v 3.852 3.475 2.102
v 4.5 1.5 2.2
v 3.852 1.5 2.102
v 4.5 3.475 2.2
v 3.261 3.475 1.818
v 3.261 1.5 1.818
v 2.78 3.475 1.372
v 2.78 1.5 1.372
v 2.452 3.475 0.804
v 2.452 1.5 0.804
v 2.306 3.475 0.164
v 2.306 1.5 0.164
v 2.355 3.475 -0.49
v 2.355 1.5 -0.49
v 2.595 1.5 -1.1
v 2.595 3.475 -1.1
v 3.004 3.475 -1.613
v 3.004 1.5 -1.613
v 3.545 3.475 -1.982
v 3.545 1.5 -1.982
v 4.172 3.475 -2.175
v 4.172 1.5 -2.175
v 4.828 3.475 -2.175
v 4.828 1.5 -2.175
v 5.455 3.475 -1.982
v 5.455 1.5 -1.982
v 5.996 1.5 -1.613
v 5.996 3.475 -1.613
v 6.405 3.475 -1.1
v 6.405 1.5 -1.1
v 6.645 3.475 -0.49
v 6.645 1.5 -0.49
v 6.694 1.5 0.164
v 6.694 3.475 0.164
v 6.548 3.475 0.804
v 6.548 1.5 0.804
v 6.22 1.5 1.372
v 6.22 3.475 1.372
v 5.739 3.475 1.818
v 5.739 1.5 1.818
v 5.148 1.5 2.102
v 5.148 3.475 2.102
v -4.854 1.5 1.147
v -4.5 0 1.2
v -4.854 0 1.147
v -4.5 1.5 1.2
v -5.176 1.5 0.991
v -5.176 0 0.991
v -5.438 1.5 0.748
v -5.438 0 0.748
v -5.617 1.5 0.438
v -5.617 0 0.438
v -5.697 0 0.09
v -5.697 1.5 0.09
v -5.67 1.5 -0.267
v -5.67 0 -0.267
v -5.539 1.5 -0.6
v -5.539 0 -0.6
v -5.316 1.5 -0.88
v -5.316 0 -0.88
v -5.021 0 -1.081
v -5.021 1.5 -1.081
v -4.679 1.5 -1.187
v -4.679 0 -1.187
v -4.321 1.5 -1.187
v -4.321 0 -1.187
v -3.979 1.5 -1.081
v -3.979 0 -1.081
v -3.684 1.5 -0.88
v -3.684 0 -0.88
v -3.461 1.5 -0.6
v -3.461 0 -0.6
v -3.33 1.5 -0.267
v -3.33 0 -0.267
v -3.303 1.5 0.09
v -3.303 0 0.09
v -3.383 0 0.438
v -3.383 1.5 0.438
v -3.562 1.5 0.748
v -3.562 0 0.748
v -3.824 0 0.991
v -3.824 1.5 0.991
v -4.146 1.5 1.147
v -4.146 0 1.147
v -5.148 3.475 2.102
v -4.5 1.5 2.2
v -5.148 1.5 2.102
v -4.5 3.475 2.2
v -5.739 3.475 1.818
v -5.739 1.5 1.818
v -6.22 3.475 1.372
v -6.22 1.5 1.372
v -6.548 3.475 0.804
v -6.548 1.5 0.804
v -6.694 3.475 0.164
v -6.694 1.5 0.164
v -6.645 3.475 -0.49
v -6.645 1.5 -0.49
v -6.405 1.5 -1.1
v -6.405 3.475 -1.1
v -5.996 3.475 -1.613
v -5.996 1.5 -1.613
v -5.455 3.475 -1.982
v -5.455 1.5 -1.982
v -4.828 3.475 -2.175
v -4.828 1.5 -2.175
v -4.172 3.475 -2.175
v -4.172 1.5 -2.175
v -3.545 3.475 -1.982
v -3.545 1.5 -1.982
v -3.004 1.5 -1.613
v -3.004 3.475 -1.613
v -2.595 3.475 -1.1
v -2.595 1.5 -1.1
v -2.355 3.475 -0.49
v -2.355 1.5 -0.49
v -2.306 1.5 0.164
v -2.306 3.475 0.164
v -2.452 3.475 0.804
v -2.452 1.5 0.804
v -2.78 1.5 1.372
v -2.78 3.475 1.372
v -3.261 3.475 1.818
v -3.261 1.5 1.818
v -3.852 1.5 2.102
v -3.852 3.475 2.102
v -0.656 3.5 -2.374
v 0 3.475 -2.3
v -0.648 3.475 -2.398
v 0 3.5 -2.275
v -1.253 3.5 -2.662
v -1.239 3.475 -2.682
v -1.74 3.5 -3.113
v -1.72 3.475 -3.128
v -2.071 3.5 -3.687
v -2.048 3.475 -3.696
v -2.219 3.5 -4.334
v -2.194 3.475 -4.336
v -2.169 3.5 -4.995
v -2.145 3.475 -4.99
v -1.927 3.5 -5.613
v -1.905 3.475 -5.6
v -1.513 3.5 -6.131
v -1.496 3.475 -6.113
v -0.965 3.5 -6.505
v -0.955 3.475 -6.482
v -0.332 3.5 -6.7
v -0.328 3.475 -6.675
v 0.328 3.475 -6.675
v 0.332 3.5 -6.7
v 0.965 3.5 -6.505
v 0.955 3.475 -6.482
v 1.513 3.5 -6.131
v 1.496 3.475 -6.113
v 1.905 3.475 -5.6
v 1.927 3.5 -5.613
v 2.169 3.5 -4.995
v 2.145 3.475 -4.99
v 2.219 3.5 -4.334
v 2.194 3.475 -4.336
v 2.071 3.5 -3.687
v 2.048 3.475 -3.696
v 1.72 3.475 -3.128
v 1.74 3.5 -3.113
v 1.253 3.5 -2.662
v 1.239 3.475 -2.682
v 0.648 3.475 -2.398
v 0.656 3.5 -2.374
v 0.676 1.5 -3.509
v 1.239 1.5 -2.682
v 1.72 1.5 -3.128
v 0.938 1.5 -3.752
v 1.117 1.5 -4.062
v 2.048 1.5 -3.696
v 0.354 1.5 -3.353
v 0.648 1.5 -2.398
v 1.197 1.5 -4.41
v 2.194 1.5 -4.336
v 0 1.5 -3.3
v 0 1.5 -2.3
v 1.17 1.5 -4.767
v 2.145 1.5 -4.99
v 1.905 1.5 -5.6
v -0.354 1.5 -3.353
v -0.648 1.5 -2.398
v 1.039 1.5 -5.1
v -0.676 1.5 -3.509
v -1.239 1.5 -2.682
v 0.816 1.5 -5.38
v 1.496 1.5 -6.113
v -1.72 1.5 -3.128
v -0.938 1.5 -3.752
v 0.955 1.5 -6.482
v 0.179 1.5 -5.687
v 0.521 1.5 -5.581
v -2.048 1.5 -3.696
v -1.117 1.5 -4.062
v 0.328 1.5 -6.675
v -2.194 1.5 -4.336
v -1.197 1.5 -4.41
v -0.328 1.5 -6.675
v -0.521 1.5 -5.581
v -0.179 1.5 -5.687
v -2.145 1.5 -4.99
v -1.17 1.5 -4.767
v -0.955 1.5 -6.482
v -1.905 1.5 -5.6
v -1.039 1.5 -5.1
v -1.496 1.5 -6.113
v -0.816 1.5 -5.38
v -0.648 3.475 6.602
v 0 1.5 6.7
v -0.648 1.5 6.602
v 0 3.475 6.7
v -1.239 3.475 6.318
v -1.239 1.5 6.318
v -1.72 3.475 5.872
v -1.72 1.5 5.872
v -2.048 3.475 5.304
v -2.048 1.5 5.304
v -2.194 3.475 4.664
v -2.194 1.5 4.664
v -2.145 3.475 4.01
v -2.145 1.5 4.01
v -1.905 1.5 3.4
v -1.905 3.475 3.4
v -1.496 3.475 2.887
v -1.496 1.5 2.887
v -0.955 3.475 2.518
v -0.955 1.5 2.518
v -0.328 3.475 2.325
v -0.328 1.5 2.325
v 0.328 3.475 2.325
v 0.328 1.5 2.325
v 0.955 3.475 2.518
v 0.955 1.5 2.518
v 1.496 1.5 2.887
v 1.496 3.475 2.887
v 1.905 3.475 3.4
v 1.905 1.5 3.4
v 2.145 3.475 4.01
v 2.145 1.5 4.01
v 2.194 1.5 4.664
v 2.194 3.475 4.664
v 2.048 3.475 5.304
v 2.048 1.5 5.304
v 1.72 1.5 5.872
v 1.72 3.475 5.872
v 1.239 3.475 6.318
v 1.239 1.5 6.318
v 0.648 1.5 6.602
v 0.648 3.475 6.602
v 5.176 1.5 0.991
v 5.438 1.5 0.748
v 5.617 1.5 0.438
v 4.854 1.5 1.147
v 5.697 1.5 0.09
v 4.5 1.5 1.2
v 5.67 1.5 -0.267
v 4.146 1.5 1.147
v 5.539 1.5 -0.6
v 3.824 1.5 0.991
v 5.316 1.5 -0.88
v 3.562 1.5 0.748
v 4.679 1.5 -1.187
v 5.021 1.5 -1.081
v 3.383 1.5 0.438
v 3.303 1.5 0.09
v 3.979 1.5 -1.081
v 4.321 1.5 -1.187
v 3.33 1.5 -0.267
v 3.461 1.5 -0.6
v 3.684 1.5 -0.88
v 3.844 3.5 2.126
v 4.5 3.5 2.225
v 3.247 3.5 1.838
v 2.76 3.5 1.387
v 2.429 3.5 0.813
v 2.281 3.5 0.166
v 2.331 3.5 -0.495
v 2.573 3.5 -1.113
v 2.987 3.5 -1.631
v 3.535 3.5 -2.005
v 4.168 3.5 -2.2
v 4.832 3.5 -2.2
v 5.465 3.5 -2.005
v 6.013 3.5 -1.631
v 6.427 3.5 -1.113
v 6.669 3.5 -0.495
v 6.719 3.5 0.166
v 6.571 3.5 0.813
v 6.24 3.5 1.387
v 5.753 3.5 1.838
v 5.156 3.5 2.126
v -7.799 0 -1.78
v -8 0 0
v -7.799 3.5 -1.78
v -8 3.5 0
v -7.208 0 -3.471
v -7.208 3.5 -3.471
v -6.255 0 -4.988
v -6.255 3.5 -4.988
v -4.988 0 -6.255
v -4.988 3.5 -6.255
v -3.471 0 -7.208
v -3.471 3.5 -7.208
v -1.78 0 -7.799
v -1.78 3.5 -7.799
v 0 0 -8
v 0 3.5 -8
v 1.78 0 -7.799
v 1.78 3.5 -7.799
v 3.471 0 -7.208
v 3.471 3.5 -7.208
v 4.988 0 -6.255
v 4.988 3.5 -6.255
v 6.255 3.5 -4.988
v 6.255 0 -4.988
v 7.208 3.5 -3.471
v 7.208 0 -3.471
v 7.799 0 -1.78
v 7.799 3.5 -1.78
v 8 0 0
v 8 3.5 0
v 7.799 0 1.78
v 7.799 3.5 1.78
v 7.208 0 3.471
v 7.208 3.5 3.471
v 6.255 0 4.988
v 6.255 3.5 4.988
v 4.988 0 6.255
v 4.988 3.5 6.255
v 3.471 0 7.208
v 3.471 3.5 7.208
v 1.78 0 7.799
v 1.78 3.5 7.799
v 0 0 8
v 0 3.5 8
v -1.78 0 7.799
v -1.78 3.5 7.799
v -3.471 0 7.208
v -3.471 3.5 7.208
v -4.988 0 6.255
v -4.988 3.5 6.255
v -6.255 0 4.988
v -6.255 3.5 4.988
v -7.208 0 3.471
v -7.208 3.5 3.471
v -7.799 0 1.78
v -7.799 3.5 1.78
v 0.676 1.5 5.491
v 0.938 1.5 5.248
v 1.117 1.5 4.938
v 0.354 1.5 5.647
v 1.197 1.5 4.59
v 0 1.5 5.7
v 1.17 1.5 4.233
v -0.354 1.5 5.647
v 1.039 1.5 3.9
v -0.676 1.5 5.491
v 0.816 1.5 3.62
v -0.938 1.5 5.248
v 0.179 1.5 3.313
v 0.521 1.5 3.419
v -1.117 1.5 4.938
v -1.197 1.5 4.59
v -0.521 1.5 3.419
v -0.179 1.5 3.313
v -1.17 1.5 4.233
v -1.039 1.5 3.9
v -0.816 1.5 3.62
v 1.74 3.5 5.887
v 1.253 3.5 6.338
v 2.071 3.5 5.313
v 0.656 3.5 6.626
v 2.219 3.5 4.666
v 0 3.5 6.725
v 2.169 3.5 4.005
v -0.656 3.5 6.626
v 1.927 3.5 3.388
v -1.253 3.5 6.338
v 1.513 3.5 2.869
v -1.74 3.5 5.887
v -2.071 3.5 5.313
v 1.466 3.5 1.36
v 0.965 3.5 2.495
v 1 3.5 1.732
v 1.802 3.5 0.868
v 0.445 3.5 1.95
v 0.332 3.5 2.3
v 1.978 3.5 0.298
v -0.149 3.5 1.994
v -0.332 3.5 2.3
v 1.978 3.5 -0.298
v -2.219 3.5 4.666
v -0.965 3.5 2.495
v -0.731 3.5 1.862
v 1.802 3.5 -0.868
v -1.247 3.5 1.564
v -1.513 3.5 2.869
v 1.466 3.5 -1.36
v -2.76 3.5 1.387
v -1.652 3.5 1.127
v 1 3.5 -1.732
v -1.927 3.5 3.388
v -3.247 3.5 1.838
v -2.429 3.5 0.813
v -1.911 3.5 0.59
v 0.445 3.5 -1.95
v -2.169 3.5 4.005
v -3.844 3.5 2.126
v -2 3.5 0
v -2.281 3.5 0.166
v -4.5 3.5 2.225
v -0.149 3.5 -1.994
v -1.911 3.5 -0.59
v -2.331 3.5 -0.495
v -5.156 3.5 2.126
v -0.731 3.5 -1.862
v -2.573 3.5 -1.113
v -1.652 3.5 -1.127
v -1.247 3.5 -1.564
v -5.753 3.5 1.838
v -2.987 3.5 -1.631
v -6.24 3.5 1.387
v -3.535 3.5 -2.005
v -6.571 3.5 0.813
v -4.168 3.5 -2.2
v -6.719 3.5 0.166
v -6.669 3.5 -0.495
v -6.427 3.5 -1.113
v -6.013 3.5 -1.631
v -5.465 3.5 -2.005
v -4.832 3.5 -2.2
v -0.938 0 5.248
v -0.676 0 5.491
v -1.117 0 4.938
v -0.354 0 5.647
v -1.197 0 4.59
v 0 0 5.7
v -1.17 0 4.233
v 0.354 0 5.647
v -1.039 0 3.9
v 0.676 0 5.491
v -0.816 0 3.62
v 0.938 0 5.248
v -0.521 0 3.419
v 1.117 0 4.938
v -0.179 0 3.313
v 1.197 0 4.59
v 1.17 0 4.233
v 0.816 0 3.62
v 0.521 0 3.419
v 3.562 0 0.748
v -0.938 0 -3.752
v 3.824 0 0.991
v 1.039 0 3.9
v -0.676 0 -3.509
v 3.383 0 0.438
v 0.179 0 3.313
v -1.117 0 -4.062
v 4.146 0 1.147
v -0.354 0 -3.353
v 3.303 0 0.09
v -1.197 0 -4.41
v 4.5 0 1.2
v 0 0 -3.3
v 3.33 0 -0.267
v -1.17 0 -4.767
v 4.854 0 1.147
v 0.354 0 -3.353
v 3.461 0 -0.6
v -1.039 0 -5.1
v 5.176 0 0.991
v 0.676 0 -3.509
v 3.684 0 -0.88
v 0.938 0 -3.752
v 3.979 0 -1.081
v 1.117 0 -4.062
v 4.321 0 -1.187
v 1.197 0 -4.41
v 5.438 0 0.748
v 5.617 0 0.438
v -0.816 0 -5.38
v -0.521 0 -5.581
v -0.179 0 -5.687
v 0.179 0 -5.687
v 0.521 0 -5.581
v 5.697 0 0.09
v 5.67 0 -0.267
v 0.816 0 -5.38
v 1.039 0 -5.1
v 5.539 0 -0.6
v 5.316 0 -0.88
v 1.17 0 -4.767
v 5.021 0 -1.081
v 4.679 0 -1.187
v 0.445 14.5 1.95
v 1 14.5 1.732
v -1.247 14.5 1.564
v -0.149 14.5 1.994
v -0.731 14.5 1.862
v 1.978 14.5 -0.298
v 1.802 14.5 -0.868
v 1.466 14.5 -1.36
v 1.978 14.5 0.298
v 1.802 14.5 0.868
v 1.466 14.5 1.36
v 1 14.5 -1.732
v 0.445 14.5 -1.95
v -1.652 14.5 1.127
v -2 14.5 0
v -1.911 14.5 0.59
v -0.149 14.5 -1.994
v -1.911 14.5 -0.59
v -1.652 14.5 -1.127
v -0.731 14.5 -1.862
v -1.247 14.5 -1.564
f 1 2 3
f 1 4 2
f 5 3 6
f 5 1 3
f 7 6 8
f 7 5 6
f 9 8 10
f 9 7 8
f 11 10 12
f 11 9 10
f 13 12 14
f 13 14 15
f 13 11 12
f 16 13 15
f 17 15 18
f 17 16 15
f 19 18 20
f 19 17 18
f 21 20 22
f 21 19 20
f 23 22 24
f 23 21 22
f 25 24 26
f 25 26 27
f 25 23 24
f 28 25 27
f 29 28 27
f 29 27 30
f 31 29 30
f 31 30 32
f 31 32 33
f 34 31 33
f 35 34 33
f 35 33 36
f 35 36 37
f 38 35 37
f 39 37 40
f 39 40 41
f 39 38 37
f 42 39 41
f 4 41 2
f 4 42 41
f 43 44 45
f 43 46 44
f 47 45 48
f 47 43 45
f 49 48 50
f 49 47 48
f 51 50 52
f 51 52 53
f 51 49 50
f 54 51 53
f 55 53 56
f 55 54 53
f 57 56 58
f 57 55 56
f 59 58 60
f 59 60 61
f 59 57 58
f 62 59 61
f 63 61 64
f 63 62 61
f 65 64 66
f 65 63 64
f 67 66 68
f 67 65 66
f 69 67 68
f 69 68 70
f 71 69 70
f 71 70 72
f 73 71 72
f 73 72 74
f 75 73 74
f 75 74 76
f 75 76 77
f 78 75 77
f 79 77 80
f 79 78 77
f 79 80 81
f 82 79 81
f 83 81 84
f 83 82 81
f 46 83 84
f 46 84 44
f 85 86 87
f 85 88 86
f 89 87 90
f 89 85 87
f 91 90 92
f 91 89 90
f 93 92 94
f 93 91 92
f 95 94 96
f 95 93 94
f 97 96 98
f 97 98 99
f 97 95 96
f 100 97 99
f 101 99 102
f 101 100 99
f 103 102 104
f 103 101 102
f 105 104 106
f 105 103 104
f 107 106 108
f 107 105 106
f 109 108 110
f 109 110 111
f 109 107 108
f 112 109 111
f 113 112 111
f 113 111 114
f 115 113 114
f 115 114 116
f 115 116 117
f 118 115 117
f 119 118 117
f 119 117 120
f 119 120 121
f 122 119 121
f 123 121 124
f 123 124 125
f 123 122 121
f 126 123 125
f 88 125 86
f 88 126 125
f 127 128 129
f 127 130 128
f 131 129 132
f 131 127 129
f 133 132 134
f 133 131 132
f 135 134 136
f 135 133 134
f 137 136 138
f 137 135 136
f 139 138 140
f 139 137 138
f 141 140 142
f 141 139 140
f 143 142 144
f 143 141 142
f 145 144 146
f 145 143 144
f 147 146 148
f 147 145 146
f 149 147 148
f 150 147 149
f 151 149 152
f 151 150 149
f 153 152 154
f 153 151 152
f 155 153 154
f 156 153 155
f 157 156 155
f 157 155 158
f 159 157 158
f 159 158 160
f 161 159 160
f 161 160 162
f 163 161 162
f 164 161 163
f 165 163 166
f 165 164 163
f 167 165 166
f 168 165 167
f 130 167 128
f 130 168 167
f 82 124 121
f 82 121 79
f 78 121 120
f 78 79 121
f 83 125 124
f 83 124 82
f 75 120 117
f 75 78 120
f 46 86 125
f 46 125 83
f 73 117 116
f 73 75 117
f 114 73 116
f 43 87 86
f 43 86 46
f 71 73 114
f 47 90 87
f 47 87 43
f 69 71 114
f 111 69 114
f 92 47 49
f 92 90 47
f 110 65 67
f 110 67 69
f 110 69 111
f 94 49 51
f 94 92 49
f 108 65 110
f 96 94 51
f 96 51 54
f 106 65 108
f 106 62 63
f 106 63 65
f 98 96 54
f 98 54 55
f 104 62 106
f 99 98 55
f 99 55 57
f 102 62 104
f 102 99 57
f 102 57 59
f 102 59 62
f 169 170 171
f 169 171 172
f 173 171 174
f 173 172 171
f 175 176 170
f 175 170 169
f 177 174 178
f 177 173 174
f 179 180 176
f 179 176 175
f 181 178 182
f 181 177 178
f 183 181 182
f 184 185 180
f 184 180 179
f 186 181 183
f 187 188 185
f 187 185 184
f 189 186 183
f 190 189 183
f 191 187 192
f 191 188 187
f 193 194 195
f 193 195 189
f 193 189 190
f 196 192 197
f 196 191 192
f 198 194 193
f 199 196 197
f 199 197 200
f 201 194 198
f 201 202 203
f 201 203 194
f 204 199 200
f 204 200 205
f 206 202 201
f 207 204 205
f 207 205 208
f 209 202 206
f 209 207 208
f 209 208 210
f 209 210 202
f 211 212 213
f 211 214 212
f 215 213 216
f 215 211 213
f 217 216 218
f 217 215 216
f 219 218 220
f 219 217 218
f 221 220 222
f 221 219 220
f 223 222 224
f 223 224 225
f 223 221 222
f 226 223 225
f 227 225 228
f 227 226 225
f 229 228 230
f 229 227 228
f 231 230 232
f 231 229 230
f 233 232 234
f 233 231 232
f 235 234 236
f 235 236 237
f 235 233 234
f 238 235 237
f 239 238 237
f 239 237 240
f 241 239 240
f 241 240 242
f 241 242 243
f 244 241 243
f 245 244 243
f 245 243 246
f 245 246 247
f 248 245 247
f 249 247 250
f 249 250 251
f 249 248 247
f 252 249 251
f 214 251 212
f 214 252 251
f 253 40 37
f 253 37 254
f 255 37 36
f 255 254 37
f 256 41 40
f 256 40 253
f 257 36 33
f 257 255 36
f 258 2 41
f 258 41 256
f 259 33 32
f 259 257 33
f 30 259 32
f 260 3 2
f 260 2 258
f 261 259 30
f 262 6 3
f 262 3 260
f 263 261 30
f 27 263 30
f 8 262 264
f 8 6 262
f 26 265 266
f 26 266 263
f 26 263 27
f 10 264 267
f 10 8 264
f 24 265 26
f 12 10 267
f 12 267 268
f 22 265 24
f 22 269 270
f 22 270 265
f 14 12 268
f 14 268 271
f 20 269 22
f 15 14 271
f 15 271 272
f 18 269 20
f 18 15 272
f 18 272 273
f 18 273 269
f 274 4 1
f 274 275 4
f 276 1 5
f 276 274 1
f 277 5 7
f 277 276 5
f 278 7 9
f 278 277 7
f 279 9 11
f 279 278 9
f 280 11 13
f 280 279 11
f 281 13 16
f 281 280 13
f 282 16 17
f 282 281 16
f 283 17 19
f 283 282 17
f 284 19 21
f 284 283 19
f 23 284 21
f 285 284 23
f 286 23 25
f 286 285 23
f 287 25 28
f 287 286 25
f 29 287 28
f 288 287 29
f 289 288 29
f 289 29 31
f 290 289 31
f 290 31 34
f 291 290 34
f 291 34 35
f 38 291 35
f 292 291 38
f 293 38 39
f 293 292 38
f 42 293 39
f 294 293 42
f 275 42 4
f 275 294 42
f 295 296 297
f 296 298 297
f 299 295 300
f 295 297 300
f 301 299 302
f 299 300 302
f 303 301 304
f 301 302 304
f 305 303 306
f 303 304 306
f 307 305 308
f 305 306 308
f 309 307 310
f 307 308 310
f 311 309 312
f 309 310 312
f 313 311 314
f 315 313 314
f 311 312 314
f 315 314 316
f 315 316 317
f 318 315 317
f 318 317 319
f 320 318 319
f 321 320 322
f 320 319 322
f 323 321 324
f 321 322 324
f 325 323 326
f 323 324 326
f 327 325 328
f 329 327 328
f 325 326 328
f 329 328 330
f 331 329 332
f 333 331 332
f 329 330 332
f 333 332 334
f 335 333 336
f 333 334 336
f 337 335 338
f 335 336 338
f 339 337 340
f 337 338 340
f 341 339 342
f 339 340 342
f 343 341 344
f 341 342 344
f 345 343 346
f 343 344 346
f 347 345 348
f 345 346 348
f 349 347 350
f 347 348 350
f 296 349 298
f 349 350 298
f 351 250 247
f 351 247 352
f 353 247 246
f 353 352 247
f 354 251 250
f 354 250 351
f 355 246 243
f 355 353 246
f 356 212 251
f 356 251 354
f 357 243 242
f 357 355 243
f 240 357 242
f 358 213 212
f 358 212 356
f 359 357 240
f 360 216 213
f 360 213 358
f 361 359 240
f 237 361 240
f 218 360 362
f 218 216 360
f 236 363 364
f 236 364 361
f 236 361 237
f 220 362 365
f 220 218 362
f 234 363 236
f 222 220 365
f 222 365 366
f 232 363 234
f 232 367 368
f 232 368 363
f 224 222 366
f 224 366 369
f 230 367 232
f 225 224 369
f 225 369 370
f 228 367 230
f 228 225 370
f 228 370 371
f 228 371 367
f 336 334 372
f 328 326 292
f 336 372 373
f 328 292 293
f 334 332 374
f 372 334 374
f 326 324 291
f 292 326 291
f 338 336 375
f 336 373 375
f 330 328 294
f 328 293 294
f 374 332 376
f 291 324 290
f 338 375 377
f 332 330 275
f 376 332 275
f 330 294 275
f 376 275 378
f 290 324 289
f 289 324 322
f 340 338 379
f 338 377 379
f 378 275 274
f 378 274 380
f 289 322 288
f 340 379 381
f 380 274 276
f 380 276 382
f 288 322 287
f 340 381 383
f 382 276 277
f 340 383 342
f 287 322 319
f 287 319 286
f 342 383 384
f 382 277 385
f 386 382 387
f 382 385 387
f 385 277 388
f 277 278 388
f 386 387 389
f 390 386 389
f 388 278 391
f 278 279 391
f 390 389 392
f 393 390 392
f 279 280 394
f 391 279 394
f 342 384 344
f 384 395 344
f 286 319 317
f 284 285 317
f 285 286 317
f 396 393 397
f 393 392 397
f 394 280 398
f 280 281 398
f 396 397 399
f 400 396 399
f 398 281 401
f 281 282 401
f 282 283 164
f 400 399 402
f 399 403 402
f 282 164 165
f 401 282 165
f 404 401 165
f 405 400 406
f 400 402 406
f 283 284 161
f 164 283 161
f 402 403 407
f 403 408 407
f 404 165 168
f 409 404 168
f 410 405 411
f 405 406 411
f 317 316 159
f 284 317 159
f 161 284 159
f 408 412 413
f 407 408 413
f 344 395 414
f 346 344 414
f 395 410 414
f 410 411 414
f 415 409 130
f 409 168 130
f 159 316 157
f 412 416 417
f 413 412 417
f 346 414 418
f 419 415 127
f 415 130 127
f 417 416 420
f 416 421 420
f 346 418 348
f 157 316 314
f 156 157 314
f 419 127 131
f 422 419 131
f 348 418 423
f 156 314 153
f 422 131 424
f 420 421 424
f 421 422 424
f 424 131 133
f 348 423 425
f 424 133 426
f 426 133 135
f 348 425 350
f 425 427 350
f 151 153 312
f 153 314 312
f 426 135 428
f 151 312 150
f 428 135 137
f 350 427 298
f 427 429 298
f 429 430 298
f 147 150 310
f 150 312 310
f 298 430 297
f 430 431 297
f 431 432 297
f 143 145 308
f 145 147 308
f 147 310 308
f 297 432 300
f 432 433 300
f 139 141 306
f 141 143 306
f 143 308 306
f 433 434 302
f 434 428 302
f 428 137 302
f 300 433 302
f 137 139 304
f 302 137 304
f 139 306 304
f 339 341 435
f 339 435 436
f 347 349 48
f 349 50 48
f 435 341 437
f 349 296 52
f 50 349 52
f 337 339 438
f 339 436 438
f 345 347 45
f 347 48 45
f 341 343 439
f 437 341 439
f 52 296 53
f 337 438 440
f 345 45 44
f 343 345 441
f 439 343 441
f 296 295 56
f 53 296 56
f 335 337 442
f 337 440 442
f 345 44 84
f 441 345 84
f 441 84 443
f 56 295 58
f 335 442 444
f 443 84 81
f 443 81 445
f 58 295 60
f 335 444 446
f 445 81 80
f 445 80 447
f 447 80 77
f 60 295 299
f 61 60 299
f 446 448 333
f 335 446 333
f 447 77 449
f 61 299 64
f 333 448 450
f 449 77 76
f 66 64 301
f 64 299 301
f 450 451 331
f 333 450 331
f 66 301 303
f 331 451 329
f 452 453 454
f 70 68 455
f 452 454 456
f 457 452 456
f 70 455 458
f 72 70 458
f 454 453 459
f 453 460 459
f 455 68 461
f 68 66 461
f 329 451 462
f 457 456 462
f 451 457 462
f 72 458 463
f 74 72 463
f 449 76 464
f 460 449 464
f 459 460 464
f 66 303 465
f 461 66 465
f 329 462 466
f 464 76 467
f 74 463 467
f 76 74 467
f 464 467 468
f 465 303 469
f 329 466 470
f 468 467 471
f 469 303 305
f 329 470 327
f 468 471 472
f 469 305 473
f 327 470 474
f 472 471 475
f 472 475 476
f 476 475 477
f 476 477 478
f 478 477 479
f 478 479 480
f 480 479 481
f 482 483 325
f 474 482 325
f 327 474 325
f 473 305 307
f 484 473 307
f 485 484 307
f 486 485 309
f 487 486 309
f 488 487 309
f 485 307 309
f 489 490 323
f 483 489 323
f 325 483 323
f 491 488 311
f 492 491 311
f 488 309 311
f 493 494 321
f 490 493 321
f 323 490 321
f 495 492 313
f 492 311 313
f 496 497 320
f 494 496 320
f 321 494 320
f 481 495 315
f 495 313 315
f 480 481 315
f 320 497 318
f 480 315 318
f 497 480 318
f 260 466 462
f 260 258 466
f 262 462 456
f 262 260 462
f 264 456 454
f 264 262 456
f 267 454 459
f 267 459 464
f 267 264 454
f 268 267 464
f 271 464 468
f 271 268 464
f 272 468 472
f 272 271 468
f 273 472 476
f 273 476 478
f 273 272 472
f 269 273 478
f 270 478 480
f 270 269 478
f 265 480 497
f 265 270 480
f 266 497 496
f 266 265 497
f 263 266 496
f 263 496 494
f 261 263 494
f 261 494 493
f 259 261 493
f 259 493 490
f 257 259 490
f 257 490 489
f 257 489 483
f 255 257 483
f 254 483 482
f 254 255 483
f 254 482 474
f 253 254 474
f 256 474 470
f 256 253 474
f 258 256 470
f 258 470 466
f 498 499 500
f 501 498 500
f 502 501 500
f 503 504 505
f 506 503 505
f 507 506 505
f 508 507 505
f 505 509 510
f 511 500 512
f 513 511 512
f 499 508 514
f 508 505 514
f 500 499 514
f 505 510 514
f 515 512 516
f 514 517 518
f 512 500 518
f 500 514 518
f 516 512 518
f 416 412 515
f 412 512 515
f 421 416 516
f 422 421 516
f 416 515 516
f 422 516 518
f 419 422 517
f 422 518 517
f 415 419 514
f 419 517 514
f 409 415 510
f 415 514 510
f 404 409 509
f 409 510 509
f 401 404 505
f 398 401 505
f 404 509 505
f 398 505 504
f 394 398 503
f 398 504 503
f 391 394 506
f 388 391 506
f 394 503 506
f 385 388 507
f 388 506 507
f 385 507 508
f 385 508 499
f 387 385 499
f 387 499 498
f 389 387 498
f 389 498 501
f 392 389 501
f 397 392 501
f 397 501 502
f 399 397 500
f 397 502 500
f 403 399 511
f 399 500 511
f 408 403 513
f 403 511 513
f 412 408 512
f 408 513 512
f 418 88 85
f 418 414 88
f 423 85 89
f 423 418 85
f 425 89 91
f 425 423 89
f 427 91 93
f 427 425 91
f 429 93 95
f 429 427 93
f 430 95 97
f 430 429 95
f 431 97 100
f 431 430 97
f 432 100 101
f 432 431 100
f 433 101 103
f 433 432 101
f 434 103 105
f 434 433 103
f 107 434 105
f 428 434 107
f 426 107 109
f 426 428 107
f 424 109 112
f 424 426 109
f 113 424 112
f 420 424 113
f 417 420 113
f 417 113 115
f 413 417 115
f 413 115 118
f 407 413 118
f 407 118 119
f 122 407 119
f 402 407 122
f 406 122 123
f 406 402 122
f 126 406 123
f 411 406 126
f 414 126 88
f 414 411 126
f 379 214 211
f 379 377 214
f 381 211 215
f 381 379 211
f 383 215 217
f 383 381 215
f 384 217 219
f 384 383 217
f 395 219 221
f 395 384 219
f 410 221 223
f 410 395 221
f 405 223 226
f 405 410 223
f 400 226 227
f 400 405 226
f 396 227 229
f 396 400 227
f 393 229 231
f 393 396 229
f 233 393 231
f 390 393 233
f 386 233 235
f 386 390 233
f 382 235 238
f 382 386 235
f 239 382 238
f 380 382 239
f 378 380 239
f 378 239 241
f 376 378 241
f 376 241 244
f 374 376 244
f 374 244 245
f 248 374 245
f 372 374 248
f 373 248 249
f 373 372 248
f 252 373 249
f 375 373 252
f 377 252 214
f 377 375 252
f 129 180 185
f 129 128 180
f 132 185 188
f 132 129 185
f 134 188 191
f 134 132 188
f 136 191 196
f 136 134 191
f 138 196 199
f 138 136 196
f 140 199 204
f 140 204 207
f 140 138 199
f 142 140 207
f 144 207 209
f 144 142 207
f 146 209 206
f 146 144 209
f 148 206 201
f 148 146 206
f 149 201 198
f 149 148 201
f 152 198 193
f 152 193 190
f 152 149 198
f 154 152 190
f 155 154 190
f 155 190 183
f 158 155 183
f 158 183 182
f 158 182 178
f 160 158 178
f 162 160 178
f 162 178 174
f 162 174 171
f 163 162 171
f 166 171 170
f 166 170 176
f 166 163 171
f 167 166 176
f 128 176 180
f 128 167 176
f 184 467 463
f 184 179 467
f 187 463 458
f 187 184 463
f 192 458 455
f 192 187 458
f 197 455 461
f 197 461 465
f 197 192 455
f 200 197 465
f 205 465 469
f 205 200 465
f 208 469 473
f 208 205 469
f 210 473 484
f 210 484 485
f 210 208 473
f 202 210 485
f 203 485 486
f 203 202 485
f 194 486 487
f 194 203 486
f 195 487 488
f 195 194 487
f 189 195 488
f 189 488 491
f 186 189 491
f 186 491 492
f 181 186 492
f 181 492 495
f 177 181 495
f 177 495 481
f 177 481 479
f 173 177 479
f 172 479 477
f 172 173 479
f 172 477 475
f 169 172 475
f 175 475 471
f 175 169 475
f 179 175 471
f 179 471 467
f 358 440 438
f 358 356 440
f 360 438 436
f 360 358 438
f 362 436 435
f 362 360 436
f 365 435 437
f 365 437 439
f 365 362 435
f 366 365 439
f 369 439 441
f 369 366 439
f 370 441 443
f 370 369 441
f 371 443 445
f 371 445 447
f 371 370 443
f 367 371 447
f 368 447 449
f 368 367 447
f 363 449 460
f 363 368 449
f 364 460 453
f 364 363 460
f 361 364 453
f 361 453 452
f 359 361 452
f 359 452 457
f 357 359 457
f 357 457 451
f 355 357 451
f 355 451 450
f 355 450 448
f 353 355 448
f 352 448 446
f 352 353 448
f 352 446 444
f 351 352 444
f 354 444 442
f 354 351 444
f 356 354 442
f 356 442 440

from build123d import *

# Parameters (mm, degrees)
CBORE_FOR_M2_SHCS1_AT_2_COUNT = 2
CBORE_FOR_M2_SHCS1_AT_2_PITCH = 6.363961031
CBORE_FOR_M2_SHCS1_AT_3_COUNT = 2
CBORE_FOR_M2_SHCS1_AT_3_PITCH = 9
CBORE_FOR_M2_SHCS1_AT_4_COUNT = 2
CBORE_FOR_M2_SHCS1_AT_4_PITCH = 6.363961031


with BuildPart() as part:
    # Sketch1 → Revolve1 (revolve)
    with BuildSketch(Plane.XY, mode=Mode.PRIVATE) as revolve1_sk:
        Polygon((0, 0), (8, 0), (8, 3.5), (2, 3.5), (2, 14.5), (0, 14.5), align=None)
    revolve(revolve1_sk.sketch.rotate(Axis((0, 14.5, 0), (0, -1, 0)), 180), axis=Axis((0, 14.5, 0), (0, -1, 0)))

    # Sketch4 → CBORE for M2 SHCS1 (revolve, cut)
    with BuildSketch(Plane(origin=(-4.5, 3.5, 0), x_dir=(0, 0, 1), z_dir=(1, 0, 0))):
        Polygon((0, 0), (0, 3.5), (1.2, 3.5), (1.2, 2), (2.2, 2), (2.2, 0.025), (2.225, 0), align=None)
    cbore_for_m2_shcs1 = revolve(axis=Axis((-4.5, 9.85, 0), (0, -1, 0)), mode=Mode.SUBTRACT)

    # CBORE for M2 SHCS1 at 2: CBORE for M2 SHCS1 ×2
    with Locations(*[Vector(0.7071067811865476, 0, -0.7071067811865476) * (i * CBORE_FOR_M2_SHCS1_AT_2_PITCH) for i in range(1, CBORE_FOR_M2_SHCS1_AT_2_COUNT)]):
        add(cbore_for_m2_shcs1, mode=Mode.SUBTRACT)

    # CBORE for M2 SHCS1 at 3: CBORE for M2 SHCS1 ×2
    with Locations(*[(i * CBORE_FOR_M2_SHCS1_AT_3_PITCH, 0, 0) for i in range(1, CBORE_FOR_M2_SHCS1_AT_3_COUNT)]):
        add(cbore_for_m2_shcs1, mode=Mode.SUBTRACT)

    # CBORE for M2 SHCS1 at 4: CBORE for M2 SHCS1 ×2
    with Locations(*[Vector(0.7071067811865476, 0, 0.7071067811865476) * (i * CBORE_FOR_M2_SHCS1_AT_4_PITCH) for i in range(1, CBORE_FOR_M2_SHCS1_AT_4_COUNT)]):
        add(cbore_for_m2_shcs1, mode=Mode.SUBTRACT)


solid = part.part
